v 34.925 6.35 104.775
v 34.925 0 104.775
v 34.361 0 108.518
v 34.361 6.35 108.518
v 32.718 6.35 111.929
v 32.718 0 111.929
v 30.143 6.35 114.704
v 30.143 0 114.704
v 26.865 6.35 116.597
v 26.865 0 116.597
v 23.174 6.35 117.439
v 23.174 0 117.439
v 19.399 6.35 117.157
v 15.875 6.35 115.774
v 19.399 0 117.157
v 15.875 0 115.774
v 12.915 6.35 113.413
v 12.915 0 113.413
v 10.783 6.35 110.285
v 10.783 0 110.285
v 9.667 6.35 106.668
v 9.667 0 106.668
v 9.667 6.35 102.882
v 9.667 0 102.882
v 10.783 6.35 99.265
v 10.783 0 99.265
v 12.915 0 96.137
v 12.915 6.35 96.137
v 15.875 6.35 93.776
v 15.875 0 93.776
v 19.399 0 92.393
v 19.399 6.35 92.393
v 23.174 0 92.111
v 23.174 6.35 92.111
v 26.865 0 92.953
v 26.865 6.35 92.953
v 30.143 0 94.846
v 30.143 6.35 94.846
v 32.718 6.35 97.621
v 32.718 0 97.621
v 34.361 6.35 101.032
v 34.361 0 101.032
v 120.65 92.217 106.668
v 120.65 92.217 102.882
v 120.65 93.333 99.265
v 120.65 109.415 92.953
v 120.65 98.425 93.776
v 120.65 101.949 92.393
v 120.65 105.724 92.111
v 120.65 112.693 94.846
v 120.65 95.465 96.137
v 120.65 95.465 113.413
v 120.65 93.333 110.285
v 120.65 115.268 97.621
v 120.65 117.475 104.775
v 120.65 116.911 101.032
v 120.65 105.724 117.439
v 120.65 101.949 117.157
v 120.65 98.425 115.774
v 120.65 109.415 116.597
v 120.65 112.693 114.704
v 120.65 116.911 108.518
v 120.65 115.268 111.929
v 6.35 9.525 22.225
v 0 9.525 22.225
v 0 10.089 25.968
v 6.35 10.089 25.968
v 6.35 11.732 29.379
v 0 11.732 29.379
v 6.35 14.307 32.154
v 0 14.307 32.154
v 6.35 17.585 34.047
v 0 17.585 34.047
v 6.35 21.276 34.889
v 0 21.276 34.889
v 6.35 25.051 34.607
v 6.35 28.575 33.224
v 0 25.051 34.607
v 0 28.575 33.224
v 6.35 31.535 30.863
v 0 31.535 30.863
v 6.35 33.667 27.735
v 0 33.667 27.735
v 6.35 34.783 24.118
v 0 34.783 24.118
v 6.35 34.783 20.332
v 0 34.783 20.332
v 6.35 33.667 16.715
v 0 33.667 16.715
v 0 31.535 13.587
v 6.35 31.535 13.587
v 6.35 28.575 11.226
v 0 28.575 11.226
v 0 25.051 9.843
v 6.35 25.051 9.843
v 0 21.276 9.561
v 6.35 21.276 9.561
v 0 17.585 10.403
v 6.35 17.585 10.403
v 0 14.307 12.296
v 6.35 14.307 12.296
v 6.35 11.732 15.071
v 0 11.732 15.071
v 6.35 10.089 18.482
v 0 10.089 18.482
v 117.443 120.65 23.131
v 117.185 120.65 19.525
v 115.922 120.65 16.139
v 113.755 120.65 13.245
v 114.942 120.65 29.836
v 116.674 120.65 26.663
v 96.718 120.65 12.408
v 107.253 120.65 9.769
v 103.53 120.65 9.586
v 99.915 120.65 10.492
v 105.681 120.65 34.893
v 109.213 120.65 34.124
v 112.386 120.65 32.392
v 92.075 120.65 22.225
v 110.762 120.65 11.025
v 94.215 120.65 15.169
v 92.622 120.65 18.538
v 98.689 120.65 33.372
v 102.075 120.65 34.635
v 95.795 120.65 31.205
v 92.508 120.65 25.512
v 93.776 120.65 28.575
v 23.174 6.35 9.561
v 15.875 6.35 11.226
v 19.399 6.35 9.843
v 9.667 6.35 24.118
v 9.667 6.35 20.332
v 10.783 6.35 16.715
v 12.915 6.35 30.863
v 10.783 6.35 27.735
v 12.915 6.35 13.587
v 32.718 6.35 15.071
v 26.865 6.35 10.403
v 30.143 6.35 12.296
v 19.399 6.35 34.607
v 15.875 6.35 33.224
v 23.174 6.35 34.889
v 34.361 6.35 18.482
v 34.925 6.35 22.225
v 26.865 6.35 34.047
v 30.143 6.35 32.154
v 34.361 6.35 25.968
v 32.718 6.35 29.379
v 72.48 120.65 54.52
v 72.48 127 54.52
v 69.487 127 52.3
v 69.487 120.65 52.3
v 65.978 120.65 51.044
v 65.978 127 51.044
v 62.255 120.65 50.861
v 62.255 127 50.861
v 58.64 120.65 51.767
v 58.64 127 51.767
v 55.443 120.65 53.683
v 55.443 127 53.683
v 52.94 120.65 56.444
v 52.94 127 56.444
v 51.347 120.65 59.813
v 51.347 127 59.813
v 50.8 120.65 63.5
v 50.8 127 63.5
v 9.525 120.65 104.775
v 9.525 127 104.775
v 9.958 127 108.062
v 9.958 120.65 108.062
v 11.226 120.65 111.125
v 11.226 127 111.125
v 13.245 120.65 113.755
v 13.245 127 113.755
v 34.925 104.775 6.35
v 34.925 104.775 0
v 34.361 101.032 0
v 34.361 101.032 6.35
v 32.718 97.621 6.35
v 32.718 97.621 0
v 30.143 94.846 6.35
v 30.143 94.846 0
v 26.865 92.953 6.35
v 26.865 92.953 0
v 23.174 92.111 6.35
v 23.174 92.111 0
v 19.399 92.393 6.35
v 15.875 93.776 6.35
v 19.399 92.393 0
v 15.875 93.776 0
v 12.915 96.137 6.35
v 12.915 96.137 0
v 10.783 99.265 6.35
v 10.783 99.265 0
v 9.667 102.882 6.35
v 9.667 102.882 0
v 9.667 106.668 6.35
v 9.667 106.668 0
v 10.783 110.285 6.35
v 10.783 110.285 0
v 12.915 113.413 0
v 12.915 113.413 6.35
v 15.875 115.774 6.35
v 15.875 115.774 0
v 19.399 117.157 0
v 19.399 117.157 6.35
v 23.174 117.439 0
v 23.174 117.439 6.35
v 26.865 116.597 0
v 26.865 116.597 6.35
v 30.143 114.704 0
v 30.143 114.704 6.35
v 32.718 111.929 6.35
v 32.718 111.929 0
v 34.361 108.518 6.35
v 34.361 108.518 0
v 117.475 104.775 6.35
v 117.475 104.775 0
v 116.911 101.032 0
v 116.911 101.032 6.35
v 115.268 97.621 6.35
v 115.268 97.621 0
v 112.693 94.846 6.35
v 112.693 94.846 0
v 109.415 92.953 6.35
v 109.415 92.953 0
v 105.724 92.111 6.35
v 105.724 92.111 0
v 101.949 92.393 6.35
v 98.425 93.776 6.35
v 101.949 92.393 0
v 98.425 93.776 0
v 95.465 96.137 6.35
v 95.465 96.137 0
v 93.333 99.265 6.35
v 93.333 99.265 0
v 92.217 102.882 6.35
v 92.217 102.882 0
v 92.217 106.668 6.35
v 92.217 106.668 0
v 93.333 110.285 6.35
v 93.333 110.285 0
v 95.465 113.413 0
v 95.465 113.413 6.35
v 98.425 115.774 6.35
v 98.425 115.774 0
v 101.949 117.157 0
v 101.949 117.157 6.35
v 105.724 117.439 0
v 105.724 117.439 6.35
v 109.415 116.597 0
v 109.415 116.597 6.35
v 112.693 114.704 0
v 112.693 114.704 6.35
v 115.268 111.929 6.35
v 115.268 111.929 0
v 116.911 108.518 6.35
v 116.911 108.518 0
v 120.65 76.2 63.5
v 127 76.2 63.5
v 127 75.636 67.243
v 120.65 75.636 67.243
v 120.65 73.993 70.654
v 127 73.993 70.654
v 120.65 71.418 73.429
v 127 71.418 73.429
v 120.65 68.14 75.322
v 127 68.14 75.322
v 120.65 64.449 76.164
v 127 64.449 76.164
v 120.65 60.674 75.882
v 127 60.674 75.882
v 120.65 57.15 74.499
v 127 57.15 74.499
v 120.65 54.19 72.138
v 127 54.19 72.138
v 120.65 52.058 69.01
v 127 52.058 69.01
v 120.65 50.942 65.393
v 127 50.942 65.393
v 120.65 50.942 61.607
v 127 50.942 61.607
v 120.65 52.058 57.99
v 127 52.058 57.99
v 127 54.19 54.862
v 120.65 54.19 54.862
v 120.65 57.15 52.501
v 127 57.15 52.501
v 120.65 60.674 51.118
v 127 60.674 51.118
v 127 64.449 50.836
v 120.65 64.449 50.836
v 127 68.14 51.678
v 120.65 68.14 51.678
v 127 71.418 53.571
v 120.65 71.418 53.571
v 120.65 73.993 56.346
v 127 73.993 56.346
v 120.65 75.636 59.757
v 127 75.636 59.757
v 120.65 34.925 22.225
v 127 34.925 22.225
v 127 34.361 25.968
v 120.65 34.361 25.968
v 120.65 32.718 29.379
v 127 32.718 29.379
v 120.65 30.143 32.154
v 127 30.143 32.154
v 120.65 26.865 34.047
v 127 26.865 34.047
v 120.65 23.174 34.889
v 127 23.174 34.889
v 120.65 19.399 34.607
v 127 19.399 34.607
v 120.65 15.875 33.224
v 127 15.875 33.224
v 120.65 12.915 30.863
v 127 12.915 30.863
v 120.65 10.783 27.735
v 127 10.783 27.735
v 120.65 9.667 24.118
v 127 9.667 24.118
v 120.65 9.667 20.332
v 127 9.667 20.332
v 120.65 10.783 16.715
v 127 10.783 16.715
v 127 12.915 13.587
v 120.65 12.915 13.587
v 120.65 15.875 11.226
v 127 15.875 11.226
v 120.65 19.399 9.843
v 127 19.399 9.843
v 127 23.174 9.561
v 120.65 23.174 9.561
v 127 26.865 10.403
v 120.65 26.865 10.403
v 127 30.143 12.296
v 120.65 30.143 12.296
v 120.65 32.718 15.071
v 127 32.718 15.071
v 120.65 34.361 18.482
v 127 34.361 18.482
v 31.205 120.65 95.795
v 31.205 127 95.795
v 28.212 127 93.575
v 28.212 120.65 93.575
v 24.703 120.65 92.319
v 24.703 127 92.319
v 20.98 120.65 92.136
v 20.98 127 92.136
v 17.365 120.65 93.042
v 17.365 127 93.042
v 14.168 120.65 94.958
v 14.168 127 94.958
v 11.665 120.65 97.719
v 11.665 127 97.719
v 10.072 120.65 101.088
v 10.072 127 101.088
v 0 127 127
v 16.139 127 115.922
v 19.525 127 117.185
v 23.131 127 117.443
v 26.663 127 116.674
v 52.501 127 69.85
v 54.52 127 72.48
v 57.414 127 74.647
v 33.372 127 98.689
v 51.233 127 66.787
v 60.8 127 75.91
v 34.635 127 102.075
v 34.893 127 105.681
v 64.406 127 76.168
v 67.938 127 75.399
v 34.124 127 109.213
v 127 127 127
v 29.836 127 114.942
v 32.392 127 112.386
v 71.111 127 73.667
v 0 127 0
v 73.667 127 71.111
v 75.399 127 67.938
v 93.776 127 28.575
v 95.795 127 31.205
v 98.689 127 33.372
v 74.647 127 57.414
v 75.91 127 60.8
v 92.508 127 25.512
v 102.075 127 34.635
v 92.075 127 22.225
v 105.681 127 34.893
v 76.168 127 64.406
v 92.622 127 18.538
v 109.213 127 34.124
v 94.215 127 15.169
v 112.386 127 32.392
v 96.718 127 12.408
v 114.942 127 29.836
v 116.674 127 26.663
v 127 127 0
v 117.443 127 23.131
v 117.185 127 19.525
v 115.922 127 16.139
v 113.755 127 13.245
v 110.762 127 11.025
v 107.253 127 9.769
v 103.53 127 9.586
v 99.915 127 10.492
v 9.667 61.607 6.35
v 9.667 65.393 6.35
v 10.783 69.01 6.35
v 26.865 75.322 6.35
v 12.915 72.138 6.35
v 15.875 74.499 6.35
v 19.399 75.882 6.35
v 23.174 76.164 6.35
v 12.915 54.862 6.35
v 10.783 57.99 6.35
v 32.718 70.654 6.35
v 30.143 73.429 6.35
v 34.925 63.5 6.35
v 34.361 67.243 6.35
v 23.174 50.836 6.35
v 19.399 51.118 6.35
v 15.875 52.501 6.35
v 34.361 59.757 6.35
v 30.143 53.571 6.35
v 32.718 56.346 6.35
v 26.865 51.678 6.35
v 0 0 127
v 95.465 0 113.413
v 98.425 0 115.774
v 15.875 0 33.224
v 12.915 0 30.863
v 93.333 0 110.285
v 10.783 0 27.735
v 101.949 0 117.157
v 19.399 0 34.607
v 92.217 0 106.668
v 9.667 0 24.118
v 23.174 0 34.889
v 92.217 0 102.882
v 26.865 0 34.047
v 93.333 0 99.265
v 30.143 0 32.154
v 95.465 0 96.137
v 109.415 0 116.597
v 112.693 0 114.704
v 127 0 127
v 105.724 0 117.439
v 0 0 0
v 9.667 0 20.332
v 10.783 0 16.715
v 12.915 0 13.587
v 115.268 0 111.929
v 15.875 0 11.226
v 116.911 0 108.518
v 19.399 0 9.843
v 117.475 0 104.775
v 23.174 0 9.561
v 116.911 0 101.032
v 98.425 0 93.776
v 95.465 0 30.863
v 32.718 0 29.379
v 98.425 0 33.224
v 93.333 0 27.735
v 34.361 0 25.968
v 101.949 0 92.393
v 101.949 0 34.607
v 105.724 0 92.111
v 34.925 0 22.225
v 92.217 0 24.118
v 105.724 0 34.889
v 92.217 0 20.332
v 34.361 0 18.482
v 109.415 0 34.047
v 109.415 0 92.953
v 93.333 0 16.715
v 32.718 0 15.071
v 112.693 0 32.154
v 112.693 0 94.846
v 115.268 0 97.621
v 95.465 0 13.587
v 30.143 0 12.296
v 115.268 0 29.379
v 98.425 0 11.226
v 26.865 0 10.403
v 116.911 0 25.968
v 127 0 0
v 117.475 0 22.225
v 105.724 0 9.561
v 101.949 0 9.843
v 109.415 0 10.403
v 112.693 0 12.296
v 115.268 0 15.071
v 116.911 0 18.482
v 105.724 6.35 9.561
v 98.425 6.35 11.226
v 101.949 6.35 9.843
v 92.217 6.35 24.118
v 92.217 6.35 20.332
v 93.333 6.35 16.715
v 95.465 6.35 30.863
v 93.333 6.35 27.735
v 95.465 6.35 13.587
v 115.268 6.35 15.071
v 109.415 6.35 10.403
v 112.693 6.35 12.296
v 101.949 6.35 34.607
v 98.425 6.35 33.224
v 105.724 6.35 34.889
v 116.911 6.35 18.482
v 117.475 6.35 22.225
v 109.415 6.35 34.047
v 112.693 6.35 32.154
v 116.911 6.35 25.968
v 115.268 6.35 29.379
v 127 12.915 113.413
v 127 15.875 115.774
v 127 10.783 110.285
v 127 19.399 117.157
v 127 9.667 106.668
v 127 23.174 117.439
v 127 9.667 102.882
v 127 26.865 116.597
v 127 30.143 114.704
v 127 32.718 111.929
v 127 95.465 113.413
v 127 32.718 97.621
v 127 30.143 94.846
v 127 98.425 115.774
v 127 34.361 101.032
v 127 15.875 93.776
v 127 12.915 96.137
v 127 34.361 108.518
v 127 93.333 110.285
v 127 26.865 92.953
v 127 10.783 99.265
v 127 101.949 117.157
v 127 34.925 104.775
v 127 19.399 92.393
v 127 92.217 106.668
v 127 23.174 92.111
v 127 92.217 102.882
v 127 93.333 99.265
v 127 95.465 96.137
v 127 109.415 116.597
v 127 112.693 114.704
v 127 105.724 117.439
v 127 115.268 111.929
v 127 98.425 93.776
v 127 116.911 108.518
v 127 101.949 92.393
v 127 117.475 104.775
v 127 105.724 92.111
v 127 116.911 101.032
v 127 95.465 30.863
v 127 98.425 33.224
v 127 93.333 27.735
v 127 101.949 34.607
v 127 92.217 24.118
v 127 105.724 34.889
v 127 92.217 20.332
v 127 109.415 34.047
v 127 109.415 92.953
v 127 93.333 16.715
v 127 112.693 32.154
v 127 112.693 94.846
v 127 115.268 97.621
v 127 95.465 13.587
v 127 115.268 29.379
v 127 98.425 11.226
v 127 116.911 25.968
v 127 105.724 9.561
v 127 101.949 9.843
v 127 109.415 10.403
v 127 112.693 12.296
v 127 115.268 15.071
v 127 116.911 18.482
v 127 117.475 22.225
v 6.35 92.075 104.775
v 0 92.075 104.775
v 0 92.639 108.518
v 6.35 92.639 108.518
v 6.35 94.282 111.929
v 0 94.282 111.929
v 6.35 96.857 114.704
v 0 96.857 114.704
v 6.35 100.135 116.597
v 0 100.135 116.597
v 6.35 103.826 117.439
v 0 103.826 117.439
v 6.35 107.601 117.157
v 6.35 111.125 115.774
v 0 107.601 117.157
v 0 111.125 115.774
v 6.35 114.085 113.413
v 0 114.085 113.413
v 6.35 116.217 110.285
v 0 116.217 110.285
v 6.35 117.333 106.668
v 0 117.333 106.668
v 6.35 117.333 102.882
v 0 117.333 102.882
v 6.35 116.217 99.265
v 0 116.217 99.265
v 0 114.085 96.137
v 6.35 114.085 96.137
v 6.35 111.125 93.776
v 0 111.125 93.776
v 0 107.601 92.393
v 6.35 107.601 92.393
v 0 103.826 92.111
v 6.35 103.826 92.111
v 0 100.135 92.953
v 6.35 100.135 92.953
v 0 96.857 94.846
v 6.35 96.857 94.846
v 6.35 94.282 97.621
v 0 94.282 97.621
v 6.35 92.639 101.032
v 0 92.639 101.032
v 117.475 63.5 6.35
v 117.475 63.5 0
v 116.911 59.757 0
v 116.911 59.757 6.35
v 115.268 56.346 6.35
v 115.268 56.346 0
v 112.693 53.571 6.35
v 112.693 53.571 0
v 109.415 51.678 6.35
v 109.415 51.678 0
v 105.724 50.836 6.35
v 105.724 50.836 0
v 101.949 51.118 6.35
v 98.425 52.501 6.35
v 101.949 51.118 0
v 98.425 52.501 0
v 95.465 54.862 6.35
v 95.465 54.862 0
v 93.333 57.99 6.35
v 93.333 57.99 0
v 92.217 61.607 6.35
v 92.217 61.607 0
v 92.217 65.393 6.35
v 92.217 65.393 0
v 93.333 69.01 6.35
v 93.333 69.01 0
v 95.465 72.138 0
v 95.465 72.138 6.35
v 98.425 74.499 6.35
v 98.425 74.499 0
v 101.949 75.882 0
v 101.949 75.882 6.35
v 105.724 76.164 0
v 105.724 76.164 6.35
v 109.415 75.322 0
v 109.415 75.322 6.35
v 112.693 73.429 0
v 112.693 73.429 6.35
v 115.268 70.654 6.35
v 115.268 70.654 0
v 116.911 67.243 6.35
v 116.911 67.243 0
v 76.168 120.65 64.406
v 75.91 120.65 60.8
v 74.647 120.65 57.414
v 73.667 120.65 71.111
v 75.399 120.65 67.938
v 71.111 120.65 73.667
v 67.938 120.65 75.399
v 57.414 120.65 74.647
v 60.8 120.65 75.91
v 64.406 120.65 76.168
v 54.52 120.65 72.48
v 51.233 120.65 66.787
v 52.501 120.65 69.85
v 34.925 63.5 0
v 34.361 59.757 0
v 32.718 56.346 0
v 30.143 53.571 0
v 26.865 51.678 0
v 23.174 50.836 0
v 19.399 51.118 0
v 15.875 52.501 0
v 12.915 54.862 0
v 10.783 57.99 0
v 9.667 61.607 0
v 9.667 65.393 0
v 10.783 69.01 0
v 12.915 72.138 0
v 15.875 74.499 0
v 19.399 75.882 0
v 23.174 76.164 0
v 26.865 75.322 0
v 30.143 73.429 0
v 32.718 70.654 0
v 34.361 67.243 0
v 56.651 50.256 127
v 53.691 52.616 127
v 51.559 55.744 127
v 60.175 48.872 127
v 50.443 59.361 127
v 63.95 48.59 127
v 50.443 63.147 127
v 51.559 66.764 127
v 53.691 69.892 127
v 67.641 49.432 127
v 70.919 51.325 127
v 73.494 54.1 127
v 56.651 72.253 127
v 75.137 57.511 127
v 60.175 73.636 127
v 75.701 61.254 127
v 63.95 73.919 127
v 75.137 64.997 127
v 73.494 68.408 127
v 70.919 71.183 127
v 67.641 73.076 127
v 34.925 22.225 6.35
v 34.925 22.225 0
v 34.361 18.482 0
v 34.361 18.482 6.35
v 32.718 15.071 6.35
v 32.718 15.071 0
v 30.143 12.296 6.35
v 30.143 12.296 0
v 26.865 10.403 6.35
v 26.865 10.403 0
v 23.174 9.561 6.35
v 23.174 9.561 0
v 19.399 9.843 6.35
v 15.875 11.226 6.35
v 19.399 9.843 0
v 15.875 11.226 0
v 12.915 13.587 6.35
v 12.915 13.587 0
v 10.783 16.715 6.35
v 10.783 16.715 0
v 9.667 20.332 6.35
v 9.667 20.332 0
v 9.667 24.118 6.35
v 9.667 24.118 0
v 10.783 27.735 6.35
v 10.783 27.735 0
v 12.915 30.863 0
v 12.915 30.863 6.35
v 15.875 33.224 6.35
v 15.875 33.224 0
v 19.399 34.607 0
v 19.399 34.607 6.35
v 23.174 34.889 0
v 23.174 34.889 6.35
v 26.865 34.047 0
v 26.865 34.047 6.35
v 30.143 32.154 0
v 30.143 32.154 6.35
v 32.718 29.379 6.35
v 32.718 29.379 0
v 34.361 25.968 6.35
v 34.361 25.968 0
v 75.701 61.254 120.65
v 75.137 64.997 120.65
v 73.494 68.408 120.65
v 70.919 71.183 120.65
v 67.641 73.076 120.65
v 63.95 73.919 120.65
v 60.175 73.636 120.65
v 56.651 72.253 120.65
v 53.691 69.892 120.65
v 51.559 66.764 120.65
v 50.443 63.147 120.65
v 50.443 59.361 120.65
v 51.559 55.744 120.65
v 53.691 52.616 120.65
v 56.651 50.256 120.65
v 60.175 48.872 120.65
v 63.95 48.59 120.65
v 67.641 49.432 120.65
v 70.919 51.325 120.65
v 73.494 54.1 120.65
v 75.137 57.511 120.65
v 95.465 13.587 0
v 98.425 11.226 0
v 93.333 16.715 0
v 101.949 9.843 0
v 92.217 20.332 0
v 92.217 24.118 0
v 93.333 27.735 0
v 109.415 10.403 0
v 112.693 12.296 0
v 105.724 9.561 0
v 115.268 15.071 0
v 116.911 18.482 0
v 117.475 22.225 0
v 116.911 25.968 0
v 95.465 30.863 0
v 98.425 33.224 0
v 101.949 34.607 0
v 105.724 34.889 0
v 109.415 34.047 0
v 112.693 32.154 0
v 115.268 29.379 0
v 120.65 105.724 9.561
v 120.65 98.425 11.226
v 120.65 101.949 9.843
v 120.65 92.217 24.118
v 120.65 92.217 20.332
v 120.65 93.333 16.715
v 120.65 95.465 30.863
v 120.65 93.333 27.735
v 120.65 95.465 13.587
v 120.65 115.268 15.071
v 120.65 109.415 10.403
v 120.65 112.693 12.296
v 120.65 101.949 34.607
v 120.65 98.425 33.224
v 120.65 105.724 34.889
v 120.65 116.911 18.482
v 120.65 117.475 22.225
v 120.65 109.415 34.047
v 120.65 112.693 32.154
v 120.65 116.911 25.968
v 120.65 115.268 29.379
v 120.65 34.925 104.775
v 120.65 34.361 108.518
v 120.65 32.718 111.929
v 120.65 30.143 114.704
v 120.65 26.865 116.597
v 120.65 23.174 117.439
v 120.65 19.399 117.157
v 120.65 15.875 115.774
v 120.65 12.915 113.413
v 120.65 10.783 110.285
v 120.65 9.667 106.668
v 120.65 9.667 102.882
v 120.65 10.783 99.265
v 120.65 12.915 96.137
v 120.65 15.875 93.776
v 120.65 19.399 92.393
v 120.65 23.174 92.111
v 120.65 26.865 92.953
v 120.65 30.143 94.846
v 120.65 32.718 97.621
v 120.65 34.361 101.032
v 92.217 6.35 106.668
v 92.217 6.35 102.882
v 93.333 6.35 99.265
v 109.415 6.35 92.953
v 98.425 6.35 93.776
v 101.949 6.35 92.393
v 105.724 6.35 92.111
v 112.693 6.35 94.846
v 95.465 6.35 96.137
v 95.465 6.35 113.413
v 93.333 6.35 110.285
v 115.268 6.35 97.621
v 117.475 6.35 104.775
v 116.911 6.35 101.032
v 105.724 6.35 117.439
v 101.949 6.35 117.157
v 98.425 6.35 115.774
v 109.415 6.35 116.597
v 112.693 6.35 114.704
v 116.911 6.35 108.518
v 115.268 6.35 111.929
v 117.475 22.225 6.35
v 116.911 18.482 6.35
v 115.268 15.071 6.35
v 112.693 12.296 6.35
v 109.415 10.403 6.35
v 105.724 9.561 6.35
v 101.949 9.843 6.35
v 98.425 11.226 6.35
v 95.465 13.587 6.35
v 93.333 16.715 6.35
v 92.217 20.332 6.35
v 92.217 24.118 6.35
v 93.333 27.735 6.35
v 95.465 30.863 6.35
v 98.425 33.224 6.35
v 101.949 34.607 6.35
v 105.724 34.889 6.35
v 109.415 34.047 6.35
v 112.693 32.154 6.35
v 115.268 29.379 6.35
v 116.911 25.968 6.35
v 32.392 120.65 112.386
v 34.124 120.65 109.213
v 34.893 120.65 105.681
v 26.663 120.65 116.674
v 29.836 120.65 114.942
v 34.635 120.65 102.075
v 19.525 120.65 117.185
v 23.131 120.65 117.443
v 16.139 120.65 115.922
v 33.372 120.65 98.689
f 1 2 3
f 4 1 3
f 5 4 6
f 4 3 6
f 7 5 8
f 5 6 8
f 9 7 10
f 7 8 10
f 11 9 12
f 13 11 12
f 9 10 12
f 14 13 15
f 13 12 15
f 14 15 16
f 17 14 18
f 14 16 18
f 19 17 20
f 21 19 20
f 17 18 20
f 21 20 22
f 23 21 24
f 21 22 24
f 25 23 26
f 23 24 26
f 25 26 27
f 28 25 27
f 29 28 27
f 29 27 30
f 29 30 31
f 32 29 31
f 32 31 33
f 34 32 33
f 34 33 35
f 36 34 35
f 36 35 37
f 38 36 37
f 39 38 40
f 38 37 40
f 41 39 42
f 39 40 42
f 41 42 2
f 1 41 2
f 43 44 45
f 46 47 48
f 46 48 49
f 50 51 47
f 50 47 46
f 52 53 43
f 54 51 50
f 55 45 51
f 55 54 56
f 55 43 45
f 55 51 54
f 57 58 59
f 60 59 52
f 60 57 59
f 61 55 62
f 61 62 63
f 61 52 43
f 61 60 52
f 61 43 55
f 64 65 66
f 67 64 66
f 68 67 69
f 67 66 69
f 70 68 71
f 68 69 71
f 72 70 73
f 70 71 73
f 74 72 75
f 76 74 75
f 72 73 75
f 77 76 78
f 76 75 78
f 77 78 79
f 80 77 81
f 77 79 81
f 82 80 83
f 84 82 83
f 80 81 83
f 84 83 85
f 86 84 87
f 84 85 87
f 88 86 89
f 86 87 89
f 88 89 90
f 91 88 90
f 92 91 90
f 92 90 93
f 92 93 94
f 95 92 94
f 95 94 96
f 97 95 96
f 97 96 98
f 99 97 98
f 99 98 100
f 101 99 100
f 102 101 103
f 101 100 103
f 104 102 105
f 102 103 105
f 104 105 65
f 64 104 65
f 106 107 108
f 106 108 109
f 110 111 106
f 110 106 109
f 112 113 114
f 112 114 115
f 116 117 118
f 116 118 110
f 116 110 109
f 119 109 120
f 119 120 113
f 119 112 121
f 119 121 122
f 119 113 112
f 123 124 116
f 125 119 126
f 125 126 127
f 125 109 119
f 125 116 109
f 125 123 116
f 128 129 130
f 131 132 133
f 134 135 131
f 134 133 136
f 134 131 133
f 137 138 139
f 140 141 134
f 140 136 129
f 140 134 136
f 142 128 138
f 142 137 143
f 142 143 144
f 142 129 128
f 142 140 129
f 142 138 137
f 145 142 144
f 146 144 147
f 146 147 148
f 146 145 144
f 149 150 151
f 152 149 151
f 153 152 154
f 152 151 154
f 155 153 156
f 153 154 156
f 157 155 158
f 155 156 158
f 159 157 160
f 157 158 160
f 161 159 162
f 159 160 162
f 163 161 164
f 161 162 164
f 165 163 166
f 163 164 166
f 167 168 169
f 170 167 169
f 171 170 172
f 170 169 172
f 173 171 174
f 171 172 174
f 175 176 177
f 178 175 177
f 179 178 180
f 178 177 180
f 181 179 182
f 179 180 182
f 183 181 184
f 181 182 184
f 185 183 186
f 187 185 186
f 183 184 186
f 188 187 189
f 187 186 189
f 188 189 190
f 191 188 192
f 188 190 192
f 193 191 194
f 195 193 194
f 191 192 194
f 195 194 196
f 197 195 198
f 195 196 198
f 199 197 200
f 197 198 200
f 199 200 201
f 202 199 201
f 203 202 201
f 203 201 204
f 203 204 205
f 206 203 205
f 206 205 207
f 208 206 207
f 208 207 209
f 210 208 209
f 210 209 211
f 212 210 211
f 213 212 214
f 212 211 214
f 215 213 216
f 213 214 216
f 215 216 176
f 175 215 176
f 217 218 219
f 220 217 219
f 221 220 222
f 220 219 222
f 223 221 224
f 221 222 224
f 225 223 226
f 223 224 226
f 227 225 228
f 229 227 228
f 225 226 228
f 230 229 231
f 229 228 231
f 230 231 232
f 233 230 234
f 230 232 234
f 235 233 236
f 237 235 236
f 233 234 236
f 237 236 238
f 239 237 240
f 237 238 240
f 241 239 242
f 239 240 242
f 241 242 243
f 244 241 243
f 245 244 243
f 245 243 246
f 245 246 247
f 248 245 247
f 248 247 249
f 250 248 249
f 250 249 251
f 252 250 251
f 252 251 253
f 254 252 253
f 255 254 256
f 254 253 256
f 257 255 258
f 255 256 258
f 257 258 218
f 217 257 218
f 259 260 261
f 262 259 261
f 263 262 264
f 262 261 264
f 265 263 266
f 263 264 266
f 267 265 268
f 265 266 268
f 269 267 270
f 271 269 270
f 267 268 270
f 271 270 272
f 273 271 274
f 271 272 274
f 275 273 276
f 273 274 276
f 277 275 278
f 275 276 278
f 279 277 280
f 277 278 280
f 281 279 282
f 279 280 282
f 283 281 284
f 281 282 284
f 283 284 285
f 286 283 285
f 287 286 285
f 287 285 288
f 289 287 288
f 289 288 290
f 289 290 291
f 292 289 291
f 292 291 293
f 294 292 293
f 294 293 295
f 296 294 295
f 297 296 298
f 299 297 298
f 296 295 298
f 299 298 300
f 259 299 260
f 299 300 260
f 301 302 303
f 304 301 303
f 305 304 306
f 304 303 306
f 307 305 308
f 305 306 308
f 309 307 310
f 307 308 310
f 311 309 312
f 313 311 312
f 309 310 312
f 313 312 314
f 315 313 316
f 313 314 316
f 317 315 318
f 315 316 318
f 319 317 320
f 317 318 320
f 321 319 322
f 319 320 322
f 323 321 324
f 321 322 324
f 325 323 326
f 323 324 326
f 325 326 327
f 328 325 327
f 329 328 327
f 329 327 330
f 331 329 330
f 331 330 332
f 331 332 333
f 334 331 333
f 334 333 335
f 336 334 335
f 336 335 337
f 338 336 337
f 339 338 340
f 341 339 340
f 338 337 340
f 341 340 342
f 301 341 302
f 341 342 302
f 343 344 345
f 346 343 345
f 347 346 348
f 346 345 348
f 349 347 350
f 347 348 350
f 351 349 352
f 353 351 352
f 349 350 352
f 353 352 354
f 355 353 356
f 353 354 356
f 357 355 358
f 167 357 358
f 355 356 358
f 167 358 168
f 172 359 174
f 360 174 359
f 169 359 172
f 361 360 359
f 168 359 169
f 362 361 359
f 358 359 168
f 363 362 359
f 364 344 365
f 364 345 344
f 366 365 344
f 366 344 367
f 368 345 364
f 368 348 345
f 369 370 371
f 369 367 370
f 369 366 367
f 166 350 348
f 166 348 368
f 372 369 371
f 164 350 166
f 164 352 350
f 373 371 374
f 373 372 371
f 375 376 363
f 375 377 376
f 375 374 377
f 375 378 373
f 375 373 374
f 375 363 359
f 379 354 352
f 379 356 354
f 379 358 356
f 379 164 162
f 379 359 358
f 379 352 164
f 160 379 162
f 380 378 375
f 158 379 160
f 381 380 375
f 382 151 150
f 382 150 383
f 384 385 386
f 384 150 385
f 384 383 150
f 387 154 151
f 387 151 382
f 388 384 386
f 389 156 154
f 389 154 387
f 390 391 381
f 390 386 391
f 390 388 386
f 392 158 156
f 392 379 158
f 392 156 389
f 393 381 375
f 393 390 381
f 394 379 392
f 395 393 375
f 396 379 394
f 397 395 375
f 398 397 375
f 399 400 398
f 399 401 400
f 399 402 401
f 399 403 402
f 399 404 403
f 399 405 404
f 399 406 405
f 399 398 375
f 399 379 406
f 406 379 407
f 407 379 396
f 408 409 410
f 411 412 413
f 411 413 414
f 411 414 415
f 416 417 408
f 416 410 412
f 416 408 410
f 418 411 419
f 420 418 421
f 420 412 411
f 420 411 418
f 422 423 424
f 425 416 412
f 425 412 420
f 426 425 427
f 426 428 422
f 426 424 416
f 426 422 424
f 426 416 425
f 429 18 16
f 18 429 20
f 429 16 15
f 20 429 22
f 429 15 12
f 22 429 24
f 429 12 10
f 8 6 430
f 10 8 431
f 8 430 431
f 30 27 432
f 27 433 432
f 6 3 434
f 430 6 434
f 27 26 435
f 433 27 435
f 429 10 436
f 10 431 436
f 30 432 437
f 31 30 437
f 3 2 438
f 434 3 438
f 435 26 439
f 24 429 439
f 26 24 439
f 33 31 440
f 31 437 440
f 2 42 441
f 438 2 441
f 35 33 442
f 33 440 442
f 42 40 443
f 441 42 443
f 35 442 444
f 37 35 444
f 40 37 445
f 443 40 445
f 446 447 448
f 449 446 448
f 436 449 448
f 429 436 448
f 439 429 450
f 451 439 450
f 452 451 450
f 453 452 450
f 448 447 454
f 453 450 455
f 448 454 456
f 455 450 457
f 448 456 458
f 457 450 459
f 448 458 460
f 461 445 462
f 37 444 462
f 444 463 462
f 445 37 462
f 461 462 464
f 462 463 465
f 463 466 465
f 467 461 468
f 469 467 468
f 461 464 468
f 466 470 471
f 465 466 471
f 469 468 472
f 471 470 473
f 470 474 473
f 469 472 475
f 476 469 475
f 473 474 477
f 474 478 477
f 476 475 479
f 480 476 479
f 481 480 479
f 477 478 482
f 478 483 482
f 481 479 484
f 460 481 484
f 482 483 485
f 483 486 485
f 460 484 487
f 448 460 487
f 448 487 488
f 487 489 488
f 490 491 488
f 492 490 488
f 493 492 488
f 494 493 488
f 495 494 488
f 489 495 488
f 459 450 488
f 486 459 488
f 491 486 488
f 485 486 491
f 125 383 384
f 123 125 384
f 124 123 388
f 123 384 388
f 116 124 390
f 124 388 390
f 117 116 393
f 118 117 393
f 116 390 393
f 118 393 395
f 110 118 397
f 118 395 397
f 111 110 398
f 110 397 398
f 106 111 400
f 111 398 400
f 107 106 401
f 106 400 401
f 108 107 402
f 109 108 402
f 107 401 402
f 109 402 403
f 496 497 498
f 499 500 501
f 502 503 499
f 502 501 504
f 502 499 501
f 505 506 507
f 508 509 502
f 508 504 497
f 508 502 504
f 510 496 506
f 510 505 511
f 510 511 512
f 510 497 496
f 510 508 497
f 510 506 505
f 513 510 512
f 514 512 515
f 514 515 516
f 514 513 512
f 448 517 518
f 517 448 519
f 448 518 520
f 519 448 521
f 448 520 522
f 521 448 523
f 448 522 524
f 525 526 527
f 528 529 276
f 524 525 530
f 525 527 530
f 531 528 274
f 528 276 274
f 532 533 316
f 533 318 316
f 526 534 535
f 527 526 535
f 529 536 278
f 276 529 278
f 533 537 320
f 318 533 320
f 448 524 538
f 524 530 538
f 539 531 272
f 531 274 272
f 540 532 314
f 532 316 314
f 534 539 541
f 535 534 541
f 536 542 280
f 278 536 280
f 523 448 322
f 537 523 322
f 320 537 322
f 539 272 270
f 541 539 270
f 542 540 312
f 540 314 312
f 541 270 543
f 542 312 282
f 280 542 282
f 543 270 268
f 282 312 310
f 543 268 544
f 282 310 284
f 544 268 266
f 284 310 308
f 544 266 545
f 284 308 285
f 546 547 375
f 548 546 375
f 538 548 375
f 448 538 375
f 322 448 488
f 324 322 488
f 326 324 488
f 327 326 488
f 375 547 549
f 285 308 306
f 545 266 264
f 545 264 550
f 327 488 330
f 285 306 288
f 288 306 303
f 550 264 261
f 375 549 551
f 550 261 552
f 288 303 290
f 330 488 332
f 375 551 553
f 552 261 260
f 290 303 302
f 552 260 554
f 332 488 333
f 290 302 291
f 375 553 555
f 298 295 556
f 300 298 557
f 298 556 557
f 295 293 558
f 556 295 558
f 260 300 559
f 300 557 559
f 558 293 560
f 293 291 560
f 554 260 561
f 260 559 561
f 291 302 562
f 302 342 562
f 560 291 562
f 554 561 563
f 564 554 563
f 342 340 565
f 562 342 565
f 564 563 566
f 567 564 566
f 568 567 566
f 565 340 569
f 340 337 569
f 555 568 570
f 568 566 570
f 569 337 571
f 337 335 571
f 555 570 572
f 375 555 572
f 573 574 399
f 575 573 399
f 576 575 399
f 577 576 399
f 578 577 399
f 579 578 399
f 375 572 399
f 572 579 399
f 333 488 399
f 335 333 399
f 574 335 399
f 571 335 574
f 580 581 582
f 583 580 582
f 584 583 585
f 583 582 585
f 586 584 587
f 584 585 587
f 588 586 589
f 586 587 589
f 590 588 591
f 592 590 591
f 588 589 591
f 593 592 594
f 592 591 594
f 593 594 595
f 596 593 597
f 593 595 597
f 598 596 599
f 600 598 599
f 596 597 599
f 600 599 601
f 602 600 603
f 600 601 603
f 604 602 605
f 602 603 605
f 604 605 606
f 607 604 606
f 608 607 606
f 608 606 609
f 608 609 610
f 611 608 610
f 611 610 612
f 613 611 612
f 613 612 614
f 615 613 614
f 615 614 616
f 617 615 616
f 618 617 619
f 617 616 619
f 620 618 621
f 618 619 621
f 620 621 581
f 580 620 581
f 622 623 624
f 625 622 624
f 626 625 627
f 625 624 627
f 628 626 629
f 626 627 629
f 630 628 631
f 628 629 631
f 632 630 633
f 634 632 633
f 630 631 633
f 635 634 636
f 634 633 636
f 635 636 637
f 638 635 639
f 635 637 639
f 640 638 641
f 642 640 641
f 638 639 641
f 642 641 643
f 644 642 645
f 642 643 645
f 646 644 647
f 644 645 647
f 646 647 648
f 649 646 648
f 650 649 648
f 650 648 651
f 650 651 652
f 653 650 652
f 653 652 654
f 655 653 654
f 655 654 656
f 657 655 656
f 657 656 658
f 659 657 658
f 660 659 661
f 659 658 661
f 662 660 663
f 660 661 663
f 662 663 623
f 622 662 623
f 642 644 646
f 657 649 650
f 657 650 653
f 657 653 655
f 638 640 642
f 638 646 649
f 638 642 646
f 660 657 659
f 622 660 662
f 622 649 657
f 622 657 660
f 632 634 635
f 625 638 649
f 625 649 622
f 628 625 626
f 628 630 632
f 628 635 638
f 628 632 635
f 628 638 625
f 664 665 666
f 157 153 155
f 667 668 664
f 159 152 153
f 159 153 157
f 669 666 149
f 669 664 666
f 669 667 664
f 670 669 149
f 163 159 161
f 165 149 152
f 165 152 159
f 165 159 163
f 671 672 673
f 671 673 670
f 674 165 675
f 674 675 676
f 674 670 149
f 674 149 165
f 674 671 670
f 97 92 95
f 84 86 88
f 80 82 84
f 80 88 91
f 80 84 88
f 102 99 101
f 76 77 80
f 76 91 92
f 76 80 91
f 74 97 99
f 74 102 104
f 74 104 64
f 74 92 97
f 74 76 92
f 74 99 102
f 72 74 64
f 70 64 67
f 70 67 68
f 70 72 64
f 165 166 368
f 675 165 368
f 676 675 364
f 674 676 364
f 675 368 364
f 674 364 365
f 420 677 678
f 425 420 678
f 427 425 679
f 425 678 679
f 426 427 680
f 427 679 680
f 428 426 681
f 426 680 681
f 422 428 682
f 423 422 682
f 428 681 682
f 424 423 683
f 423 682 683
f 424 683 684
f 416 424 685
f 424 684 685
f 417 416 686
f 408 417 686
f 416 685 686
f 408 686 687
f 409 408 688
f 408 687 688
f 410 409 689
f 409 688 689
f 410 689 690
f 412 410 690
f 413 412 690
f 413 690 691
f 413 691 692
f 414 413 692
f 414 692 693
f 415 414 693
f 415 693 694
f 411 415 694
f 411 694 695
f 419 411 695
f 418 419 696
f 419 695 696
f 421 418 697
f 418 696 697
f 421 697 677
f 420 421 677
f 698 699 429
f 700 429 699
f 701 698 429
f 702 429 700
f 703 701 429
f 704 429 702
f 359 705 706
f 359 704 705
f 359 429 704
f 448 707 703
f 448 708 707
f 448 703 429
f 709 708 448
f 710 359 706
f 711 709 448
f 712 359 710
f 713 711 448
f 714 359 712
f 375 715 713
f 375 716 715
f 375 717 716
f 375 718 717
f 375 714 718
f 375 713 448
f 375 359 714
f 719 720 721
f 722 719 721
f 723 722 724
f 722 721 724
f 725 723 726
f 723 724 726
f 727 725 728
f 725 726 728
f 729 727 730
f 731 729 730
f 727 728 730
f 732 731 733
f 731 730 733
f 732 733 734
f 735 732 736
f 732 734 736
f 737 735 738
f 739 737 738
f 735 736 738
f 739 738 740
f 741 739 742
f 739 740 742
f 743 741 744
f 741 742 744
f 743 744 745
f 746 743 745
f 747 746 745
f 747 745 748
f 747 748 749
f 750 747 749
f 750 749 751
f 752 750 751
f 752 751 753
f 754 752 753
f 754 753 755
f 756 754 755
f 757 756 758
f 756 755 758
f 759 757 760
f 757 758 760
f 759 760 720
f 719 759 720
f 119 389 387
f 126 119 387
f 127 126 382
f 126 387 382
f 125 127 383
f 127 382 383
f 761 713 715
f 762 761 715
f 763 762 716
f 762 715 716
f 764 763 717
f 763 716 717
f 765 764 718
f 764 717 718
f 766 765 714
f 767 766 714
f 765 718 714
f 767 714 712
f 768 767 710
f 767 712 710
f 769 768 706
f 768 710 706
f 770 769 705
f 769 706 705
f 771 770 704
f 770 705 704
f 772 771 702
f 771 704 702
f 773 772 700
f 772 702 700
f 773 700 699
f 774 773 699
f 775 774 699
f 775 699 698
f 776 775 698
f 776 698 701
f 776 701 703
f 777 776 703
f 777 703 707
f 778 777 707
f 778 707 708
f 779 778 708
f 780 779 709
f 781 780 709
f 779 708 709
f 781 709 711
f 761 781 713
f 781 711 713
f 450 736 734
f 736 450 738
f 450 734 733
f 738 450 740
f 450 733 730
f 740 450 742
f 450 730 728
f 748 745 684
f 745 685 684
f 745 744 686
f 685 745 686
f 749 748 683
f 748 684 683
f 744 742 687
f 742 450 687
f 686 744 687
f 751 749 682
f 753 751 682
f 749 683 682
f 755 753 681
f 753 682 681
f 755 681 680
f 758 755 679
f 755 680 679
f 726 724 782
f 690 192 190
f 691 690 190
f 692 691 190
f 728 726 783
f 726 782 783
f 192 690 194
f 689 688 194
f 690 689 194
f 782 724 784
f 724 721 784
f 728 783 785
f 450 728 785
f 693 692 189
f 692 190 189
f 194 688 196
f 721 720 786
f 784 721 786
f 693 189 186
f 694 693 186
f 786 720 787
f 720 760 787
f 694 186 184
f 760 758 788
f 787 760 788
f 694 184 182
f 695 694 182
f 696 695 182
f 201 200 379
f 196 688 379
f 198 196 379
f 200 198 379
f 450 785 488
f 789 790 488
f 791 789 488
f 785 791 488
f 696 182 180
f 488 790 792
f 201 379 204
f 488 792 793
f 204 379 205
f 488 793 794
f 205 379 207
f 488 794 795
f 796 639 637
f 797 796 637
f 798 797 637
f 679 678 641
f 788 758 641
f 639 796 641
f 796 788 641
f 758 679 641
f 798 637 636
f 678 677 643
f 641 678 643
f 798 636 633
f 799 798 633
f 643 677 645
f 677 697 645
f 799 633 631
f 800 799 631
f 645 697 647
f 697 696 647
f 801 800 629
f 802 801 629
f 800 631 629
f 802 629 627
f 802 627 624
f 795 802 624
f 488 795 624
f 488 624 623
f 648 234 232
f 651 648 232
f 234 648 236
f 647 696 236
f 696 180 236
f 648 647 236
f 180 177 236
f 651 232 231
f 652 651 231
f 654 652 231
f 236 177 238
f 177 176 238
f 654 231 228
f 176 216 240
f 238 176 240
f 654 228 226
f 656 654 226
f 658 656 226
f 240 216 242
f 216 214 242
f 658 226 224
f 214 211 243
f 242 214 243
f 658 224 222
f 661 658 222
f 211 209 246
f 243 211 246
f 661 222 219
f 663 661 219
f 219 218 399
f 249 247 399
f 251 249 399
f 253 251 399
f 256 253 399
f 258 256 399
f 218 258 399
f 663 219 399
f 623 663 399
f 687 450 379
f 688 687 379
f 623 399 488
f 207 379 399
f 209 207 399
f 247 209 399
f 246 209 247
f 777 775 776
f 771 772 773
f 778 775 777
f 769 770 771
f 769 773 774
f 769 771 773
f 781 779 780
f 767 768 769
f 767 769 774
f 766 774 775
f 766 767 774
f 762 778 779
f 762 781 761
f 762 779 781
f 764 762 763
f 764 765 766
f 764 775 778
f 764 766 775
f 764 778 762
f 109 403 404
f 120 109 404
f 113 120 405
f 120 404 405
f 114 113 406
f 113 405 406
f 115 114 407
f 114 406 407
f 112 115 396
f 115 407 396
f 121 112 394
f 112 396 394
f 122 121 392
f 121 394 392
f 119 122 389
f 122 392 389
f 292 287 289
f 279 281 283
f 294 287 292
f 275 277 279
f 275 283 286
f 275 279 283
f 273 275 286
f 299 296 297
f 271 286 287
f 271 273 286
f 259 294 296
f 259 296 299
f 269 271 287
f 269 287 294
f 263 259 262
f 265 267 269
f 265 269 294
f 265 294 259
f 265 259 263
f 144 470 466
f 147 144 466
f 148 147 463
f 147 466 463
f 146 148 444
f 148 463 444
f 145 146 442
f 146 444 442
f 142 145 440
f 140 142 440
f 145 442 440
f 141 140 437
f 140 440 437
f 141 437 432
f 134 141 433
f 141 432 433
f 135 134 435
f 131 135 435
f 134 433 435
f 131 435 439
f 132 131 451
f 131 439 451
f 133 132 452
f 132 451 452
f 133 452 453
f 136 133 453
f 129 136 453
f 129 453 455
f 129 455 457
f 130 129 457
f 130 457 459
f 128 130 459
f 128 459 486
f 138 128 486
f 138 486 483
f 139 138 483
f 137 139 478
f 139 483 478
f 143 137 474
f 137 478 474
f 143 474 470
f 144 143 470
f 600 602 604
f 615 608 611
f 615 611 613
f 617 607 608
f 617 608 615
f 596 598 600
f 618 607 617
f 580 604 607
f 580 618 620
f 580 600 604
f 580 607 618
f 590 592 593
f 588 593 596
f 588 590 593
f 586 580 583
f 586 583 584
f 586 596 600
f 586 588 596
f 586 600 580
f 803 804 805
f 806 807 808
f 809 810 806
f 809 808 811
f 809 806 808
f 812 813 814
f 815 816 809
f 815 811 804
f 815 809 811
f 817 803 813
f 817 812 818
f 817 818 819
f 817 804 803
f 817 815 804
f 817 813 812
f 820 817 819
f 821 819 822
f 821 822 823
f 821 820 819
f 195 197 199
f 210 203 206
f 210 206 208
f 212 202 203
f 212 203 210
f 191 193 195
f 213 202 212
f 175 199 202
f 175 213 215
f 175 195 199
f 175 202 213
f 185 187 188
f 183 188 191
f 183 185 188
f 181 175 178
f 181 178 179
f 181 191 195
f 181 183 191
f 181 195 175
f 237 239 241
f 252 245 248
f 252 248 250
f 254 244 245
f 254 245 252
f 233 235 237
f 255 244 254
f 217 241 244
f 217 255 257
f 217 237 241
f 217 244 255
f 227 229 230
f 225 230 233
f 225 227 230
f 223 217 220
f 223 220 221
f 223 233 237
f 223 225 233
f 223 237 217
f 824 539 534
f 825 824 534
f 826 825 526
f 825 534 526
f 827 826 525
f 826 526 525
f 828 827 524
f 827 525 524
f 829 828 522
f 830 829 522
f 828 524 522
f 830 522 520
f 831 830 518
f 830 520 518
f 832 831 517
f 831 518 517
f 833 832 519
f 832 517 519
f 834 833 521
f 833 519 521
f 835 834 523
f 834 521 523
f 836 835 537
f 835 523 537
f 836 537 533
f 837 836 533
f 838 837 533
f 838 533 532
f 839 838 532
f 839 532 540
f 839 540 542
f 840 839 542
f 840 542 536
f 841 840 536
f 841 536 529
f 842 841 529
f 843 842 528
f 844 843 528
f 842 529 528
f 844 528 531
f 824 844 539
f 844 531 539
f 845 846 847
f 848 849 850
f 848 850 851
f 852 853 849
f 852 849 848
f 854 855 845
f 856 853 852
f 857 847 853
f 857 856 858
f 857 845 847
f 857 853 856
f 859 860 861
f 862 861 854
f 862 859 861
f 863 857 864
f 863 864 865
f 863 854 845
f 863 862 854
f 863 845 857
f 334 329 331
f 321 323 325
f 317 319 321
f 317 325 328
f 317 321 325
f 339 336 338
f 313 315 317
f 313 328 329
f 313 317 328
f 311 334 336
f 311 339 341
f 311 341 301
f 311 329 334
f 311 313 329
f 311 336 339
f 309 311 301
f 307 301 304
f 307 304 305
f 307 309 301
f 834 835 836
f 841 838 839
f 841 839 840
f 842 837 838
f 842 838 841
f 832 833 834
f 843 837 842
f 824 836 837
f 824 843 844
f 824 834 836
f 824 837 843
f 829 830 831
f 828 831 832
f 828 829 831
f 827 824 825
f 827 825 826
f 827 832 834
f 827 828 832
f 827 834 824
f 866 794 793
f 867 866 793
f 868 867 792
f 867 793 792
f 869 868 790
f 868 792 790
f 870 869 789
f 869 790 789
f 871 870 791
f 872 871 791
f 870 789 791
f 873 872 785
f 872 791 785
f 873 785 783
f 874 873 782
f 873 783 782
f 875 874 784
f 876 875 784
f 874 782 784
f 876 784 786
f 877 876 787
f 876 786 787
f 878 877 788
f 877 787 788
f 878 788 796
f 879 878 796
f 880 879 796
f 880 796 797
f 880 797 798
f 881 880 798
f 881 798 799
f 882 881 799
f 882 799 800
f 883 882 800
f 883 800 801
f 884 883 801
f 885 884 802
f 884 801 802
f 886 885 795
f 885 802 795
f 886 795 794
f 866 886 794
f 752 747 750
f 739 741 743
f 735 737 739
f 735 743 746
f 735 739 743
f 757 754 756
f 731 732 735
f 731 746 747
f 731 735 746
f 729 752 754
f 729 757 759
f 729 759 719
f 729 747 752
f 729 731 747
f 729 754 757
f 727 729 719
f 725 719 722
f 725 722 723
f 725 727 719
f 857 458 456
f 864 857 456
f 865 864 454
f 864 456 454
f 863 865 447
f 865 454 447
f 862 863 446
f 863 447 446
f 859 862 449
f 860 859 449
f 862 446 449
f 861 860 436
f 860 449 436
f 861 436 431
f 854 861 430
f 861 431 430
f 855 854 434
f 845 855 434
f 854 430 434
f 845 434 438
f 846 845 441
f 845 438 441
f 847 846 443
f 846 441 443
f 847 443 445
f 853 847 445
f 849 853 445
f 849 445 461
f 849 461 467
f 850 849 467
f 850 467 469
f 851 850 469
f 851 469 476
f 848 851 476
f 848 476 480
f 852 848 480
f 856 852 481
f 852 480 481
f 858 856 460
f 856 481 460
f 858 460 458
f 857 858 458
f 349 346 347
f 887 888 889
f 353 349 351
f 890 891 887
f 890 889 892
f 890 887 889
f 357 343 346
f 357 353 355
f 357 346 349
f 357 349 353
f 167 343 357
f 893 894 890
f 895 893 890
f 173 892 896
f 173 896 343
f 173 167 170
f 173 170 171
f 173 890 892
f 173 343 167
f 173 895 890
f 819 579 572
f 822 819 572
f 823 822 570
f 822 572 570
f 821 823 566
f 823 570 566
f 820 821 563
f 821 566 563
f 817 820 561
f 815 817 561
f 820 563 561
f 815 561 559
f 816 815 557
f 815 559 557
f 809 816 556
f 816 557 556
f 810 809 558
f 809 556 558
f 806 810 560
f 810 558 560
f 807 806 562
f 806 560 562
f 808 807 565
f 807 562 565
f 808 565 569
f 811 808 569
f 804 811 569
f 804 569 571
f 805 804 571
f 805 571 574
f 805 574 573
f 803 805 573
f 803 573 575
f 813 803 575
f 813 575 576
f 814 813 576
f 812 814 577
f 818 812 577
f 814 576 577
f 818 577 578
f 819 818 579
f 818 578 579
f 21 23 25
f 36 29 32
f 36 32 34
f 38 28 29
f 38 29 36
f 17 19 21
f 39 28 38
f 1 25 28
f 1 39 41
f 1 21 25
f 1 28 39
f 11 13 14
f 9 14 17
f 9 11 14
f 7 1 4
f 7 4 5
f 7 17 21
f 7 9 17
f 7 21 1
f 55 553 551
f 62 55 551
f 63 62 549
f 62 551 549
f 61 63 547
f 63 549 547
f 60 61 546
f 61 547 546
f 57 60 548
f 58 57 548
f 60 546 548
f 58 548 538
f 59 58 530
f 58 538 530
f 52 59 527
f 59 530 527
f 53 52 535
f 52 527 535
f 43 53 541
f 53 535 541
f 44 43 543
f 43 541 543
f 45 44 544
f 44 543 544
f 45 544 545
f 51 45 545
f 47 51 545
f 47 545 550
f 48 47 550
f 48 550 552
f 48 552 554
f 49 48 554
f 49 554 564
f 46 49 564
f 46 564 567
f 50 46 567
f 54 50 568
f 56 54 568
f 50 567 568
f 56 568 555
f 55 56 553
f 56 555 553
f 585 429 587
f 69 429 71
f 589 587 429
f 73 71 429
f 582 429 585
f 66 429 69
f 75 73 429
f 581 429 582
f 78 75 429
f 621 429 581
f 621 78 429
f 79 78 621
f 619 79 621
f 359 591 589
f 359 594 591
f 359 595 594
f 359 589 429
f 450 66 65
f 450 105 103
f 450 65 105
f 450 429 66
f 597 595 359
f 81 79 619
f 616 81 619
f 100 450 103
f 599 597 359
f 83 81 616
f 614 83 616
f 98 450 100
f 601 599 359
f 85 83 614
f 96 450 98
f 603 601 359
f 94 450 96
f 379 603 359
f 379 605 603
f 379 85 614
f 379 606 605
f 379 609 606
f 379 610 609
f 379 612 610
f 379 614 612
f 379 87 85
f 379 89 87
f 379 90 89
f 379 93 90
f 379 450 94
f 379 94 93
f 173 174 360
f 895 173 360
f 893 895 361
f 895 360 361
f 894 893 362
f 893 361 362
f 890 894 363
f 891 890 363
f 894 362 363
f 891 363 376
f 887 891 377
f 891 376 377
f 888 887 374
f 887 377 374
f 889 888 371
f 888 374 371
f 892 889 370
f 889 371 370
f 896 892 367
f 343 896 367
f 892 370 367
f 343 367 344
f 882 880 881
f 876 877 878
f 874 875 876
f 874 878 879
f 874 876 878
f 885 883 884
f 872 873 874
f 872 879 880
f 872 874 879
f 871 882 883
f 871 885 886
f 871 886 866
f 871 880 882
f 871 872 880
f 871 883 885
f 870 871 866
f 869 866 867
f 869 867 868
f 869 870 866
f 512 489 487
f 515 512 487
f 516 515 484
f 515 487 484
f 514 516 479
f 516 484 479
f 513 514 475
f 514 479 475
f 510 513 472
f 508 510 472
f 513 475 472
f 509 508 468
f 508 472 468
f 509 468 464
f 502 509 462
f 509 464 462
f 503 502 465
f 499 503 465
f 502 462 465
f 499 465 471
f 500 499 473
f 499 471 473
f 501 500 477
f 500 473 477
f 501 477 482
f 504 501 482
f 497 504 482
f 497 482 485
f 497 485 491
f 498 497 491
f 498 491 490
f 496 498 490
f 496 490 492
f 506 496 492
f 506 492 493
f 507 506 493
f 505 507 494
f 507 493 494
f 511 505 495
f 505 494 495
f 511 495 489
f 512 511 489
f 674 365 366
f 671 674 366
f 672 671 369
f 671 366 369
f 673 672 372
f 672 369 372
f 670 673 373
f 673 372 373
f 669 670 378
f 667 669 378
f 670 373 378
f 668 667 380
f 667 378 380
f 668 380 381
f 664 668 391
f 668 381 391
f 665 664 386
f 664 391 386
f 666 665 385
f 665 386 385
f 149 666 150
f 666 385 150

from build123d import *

# Parameters (mm, degrees)
F0_W      = 127
F0_H      = 127
F1_DEPTH  = 127
F2_R      = 12.7
F3_DEPTH  = 6.35
F4_R      = 12.7
F5_DEPTH  = 6.35
F6_R      = 12.7
F7_DEPTH  = 6.35
F8_R      = 12.7
F9_DEPTH  = 6.35
F11_DEPTH = 6.35
F12_R     = 12.7
F13_DEPTH = 6.35


with BuildPart() as f1:
    # F0 (on Top) → F1 (new body)
    with BuildSketch(Plane.XY):
        with Locations((63.5, 63.5)):
            Rectangle(F0_W, F0_H)
    extrude(amount=F1_DEPTH)

    # F2 (on face) → F3 (cut)
    with BuildSketch(Plane.XY.offset(127)):
        with Locations((63.000895, 61.254025)):
            Circle(F2_R)
    extrude(amount=-F3_DEPTH, mode=Mode.SUBTRACT)

    # F4 (on face) → F5 (cut)
    with BuildSketch(Plane(origin=(0, 0, 0), x_dir=(1, 0, 0), z_dir=(0, 0, -1))):
        with Locations((22.225, -22.225)):
            Circle(F4_R)
        with Locations((22.225, -63.5)):
            Circle(F4_R)
        with Locations((22.225, -104.775)):
            Circle(F4_R)
        with Locations((104.775, -63.5)):
            Circle(F4_R)
        with Locations((104.775, -22.225)):
            Circle(F4_R)
        with Locations((104.775, -104.775)):
            Circle(F4_R)
    extrude(amount=-F5_DEPTH, mode=Mode.SUBTRACT)

    # F6 (on face) → F7 (cut)
    with BuildSketch(Plane(origin=(0, 0, 0), x_dir=(0, -1, 0), z_dir=(-1, 0, 0))):
        with Locations((-22.225, 22.225)):
            Circle(F6_R)
        with Locations((-104.775, 104.775)):
            Circle(F6_R)
    extrude(amount=-F7_DEPTH, mode=Mode.SUBTRACT)

    # F8 (on face) → F9 (cut)
    with BuildSketch(Plane.YZ.offset(127)):
        with Locations((22.225, 104.775)):
            Circle(F8_R)
        with Locations((63.5, 63.5)):
            Circle(F8_R)
        with Locations((22.225, 22.225)):
            Circle(F8_R)
        with Locations((104.775, 104.775)):
            Circle(F8_R)
        with Locations((104.775, 22.225)):
            Circle(F8_R)
    extrude(amount=-F9_DEPTH, mode=Mode.SUBTRACT)

    # F10 (on face) → F11 (cut)
    with BuildSketch(Plane(origin=(0, 127, 0), x_dir=(-1, 0, 0), z_dir=(0, 1, 0))):
        with BuildLine():
            ThreePointArc((-95.794744, 31.205256), (-113.755256, 31.205256), (-113.755256, 13.244744))
            Line((-113.755256, 13.244744), (-95.794744, 31.205256))
        make_face()
        with BuildLine():
            ThreePointArc((-13.244744, 113.755256), (-31.205256, 113.755256), (-31.205256, 95.794744))
            Line((-31.205256, 95.794744), (-13.244744, 113.755256))
        make_face()
        with BuildLine():
            Line((-13.244744, 113.755256), (-31.205256, 95.794744))
            ThreePointArc((-31.205256, 95.794744), (-17.36492, 93.04173), (-9.525, 104.775))
            ThreePointArc((-9.525, 104.775), (-10.49173, 109.63508), (-13.244744, 113.755256))
        make_face()
        with BuildLine():
            ThreePointArc((-54.519744, 72.480256), (-72.480256, 72.480256), (-72.480256, 54.519744))
            Line((-72.480256, 54.519744), (-54.519744, 72.480256))
        make_face()
        with BuildLine():
            Line((-54.519744, 72.480256), (-72.480256, 54.519744))
            ThreePointArc((-72.480256, 54.519744), (-58.63992, 51.76673), (-50.8, 63.5))
            ThreePointArc((-50.8, 63.5), (-51.76673, 68.36008), (-54.519744, 72.480256))
        make_face()
        with BuildLine():
            Line((-95.794744, 31.205256), (-113.755256, 13.244744))
            ThreePointArc((-113.755256, 13.244744), (-99.91492, 10.49173), (-92.075, 22.225))
            ThreePointArc((-92.075, 22.225), (-93.04173, 27.08508), (-95.794744, 31.205256))
        make_face()
    extrude(amount=-F11_DEPTH, mode=Mode.SUBTRACT)

    # F12 (on face) → F13 (cut)
    with BuildSketch(Plane.XZ):
        with Locations((22.225, 22.225)):
            Circle(F12_R)
        with Locations((22.225, 104.775)):
            Circle(F12_R)
        with Locations((104.775, 104.775)):
            Circle(F12_R)
        with Locations((104.775, 22.225)):
            Circle(F12_R)
    extrude(amount=-F13_DEPTH, mode=Mode.SUBTRACT)


solid = f1.part
